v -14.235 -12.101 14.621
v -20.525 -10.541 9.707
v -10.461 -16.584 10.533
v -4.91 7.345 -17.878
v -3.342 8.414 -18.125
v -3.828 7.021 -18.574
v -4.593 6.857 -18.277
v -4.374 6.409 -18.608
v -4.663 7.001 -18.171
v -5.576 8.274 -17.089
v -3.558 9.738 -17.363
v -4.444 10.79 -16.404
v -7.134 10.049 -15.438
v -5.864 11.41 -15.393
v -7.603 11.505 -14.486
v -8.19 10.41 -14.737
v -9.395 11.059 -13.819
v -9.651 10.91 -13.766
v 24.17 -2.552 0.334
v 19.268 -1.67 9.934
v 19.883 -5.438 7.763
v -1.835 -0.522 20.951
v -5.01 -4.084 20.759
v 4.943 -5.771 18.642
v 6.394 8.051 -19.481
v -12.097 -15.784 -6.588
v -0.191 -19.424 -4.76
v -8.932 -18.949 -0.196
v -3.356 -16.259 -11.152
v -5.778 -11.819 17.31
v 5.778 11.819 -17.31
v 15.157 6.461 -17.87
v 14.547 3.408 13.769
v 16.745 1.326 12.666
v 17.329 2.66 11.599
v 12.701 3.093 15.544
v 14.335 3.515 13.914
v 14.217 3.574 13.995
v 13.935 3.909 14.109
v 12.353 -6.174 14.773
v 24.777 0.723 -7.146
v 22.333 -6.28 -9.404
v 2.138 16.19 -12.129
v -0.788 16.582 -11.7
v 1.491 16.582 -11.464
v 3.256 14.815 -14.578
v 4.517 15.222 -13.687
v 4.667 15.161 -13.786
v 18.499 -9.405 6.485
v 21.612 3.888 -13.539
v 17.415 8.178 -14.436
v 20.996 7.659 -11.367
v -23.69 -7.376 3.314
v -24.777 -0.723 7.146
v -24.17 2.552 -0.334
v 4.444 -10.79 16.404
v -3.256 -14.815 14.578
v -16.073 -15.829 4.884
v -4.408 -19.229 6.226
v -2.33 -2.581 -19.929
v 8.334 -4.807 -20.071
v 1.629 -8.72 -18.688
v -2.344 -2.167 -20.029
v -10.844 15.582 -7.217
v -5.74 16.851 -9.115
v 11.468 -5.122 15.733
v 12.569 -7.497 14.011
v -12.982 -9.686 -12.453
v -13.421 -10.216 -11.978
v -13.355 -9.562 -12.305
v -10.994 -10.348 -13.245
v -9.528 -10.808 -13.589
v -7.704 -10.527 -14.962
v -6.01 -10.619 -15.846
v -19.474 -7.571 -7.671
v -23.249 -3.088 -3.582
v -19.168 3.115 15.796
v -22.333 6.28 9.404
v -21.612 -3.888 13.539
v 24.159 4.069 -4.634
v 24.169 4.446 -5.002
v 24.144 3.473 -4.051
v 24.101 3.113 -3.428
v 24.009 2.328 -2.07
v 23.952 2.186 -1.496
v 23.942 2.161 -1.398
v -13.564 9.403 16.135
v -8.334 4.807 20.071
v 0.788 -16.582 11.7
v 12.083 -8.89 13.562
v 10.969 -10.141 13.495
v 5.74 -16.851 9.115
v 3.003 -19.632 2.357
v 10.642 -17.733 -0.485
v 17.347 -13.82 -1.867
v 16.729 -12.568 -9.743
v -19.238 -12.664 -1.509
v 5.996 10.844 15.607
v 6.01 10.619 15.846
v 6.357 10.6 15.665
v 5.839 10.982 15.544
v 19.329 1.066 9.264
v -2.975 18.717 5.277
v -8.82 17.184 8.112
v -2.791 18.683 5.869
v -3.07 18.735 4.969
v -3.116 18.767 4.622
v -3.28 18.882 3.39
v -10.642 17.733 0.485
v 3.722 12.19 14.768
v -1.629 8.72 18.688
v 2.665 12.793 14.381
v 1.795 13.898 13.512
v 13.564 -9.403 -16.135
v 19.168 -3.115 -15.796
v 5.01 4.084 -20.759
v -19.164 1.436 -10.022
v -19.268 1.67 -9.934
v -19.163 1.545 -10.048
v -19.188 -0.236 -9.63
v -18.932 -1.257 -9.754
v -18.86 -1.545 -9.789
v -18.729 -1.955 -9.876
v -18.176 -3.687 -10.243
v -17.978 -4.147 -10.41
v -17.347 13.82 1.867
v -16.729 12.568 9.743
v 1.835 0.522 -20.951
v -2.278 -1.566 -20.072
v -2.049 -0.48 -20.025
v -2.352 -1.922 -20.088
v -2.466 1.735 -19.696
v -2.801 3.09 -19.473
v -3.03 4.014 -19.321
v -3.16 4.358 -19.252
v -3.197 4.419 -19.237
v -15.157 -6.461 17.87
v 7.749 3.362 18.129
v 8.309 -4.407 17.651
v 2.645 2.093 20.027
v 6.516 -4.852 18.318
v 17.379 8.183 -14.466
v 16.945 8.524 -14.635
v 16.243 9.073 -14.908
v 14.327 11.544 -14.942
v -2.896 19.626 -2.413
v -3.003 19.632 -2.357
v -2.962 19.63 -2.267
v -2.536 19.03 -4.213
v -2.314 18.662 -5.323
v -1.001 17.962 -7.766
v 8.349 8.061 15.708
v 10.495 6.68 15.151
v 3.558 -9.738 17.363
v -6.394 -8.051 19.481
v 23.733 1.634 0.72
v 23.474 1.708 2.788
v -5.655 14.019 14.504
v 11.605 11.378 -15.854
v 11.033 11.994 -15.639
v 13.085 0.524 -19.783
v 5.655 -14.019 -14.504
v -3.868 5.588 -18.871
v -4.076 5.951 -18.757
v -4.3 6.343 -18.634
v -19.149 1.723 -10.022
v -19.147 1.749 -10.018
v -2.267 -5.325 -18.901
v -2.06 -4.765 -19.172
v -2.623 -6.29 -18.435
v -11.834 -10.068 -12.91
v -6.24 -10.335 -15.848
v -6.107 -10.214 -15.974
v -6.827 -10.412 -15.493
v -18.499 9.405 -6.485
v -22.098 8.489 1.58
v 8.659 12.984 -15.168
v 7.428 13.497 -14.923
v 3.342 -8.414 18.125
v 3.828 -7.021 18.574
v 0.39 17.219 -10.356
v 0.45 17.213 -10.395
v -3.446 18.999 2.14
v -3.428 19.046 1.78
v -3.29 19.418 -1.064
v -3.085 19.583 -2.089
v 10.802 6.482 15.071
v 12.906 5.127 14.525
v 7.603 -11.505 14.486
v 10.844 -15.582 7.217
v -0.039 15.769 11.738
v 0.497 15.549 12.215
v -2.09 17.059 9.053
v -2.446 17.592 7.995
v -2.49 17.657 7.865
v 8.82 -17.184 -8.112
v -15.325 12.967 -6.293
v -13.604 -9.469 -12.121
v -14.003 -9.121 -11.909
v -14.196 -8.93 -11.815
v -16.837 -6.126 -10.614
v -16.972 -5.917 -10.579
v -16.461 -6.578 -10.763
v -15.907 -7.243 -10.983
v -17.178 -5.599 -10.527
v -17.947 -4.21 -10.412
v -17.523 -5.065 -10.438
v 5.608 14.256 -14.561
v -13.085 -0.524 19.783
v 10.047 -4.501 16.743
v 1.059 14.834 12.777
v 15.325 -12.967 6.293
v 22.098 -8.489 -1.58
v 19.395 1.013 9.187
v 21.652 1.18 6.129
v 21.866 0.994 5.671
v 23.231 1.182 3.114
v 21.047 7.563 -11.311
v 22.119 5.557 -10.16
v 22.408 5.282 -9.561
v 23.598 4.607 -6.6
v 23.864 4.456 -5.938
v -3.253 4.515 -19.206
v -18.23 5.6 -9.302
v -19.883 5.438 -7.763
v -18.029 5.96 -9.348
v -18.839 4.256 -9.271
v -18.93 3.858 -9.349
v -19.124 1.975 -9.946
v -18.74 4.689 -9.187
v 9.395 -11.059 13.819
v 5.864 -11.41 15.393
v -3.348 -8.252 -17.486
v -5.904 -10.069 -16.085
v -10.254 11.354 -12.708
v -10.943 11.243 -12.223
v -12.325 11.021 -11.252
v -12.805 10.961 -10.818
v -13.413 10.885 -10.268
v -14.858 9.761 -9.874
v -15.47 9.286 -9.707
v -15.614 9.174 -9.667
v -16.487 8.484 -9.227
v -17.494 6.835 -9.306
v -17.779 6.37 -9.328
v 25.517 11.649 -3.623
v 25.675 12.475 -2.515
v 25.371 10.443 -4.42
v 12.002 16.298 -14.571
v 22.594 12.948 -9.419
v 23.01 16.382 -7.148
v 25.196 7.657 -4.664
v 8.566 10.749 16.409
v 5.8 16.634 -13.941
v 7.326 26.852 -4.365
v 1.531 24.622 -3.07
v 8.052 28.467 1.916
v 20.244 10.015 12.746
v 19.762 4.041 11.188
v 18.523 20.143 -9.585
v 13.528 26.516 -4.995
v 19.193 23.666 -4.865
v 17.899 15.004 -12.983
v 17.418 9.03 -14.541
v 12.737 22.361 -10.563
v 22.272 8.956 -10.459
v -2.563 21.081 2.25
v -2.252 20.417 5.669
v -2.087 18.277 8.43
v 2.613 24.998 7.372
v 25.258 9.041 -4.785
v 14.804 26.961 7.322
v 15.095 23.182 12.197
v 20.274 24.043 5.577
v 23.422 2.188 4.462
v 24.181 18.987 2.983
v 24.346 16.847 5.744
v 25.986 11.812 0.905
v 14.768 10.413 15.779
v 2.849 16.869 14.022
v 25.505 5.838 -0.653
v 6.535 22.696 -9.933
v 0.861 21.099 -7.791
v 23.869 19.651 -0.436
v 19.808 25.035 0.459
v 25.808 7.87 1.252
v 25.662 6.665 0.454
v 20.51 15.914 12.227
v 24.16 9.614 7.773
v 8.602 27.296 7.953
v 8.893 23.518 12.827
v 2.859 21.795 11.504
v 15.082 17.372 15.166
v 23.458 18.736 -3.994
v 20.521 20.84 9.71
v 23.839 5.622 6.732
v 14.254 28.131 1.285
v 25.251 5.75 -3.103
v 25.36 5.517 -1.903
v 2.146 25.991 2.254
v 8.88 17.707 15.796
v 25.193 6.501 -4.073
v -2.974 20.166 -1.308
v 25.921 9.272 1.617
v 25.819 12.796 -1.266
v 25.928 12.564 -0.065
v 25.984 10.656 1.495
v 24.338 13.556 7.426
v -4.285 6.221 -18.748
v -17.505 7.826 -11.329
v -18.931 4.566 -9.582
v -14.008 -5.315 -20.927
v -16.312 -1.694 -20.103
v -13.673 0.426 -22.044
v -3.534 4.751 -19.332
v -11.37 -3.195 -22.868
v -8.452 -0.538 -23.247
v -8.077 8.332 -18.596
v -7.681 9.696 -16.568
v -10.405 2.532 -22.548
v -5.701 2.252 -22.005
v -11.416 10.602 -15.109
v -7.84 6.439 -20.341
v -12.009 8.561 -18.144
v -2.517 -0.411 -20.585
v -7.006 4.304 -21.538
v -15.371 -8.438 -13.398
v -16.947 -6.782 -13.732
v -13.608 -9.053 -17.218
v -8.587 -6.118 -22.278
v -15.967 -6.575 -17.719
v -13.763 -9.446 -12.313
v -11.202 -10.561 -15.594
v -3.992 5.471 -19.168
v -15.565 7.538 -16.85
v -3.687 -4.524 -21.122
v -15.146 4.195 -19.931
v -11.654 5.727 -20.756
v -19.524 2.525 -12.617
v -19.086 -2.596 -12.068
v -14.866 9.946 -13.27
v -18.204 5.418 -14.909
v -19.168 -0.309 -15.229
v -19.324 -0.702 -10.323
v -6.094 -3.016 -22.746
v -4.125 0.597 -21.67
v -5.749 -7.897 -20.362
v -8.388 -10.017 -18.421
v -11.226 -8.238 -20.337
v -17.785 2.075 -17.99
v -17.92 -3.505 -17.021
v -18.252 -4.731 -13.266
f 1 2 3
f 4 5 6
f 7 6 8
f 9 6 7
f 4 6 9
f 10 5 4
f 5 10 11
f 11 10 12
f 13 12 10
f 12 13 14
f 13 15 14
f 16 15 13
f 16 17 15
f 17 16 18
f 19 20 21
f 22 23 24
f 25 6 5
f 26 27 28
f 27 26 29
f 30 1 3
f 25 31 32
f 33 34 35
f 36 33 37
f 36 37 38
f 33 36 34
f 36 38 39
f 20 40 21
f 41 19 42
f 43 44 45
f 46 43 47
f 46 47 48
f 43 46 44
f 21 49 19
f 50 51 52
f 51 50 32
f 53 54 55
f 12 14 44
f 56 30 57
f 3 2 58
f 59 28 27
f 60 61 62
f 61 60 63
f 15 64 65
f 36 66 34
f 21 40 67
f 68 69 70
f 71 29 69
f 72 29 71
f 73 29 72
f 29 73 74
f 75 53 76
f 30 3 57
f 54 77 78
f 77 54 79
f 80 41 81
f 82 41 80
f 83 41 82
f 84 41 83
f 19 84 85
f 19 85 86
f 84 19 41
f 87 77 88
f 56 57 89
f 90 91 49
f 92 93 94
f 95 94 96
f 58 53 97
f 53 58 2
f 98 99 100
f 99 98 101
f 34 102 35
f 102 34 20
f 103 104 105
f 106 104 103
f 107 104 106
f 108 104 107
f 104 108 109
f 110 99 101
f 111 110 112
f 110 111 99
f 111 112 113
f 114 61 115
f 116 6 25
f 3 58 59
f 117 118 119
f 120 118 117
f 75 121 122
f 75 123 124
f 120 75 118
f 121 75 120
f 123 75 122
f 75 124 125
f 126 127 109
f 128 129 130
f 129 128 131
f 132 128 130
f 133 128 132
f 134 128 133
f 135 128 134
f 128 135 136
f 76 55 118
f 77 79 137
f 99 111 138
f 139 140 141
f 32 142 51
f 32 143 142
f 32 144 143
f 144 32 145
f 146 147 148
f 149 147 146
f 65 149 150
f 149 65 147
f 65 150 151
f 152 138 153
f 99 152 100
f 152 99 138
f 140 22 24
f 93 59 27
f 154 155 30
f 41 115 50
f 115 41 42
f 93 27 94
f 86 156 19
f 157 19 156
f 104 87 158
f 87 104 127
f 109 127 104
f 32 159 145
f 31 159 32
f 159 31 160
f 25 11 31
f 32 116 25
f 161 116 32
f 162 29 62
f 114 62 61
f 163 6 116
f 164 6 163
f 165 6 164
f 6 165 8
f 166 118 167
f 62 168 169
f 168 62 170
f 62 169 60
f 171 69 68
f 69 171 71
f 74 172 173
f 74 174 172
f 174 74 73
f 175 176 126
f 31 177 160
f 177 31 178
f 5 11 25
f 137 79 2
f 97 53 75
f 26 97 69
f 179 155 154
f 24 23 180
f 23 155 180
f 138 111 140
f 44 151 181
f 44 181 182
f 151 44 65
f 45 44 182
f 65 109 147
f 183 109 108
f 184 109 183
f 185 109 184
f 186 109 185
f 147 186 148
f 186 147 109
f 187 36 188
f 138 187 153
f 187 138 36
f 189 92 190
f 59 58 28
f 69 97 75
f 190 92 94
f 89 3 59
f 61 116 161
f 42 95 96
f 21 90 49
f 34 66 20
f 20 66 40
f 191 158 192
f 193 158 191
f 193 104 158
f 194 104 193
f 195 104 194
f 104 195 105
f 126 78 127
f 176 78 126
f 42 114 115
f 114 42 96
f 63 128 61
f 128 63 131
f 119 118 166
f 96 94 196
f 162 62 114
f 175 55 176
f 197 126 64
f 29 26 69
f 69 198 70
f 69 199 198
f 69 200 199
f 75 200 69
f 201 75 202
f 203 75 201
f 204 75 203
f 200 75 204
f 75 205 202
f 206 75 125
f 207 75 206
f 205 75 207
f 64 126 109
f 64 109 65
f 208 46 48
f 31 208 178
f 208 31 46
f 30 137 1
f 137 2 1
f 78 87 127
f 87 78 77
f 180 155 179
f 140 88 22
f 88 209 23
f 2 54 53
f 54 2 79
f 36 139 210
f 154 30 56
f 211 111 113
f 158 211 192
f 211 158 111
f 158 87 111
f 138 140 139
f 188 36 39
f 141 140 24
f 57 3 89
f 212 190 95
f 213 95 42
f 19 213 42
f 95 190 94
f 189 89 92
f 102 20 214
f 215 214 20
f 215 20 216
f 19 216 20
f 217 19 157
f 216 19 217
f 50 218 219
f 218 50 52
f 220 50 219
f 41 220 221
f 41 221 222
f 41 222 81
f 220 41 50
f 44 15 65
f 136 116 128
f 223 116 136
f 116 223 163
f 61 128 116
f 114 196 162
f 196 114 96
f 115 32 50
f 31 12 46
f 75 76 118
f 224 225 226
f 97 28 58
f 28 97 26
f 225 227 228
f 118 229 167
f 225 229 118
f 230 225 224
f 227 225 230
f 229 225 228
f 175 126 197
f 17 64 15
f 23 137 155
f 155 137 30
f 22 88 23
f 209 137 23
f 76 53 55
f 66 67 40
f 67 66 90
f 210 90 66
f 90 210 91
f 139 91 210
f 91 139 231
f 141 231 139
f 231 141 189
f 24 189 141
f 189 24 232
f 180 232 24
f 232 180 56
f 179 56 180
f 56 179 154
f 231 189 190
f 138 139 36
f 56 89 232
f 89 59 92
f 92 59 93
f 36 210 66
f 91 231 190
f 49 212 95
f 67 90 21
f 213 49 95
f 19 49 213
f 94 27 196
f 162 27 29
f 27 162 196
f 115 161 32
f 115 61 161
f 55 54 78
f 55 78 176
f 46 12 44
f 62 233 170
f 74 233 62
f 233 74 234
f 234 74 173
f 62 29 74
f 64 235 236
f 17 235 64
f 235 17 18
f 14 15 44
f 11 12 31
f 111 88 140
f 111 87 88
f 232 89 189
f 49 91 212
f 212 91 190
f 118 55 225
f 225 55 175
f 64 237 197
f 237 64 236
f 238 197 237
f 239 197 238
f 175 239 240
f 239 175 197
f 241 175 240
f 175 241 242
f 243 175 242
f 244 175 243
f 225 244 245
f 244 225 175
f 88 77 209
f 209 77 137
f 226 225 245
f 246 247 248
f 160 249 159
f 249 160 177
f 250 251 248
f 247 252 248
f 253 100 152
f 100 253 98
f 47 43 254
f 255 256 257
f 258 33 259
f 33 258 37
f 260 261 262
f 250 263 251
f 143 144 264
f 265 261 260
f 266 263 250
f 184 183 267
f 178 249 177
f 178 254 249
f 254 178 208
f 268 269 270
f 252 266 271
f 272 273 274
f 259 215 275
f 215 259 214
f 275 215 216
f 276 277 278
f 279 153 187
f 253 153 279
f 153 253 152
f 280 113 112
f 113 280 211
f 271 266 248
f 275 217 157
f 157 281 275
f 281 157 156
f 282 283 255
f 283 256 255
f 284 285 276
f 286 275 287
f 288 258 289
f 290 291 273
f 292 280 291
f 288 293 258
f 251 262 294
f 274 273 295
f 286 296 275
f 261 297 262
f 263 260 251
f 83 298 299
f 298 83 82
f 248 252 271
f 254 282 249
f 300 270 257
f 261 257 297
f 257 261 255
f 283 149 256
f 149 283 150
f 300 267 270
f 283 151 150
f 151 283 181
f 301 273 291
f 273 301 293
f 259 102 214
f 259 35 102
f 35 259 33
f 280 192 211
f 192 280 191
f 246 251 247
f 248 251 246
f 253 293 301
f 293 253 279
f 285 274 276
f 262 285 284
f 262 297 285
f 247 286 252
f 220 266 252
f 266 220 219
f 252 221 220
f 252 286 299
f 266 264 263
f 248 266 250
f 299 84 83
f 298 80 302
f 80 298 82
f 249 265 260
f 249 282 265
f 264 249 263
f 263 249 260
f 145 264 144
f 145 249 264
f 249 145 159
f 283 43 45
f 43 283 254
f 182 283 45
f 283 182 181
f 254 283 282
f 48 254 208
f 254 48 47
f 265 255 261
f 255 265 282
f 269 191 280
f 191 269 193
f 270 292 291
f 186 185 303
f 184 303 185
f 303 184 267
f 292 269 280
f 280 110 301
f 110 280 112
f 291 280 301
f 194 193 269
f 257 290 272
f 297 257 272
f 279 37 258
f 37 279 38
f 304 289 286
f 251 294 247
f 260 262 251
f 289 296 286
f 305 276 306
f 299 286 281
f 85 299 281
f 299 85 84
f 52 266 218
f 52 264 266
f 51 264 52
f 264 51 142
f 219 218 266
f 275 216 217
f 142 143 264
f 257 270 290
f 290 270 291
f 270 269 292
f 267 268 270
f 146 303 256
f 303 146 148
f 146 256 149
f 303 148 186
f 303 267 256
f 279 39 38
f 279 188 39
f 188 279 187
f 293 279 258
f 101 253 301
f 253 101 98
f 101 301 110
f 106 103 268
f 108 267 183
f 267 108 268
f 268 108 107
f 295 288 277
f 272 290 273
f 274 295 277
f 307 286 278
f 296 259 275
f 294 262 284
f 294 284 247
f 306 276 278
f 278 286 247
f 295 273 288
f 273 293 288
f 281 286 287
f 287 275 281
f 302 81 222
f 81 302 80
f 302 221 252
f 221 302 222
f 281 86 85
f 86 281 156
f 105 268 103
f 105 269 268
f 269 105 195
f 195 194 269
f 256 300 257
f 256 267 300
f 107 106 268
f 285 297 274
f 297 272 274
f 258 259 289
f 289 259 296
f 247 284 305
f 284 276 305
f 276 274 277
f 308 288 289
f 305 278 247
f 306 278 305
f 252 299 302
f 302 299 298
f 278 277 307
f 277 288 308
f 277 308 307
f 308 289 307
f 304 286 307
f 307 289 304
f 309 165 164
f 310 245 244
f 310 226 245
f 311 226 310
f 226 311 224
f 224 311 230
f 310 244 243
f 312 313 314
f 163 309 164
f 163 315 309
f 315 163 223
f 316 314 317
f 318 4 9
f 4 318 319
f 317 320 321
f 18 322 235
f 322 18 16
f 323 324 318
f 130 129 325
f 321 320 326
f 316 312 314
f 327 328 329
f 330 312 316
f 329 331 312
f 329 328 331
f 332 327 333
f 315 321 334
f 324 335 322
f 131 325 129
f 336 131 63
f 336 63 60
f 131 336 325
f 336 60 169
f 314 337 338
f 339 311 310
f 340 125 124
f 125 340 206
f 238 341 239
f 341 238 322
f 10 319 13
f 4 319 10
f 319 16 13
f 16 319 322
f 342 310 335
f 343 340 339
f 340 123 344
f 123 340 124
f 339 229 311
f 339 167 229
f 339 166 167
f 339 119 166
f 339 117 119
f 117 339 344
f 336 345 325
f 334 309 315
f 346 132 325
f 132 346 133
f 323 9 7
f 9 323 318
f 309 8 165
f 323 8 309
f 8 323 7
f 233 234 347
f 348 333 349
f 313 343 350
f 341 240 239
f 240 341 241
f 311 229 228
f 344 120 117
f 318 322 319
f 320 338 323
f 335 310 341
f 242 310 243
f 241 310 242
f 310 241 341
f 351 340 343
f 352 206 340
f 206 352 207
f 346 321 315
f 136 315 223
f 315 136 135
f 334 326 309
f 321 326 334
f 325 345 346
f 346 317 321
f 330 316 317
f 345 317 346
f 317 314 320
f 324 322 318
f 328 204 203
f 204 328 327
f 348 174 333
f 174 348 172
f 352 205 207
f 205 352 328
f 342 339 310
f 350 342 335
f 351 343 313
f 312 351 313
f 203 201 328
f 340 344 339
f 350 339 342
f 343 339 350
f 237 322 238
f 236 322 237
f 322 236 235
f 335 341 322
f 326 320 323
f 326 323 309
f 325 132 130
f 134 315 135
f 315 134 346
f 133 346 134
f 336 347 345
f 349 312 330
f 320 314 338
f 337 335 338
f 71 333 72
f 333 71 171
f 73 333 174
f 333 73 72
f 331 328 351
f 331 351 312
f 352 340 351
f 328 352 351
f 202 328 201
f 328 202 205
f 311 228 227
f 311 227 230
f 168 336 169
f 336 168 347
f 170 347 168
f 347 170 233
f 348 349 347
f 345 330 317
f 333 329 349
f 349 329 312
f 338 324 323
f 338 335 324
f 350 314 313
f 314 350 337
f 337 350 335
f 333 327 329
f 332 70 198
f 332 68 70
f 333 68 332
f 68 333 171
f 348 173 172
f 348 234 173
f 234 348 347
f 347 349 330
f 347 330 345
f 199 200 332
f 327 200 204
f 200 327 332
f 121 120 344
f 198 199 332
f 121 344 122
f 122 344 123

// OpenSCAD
$fn=16;
rotate(a = 35, v = [1, 1, 0])
union() {
	scale(v = [1.3, 1.0, 1.0])
		sphere(r = 20);
	translate(v = [10, 10, 0])
		rotate(a = 70, v = [0, 1, 0])
			scale( v = [1.0, 1.2, 1.0])
				sphere(r = 16);
	rotate(a = 30, v = [0, 1, 1])
		translate(v = [0, -5, -15])
			rotate(a = 90, v = [0, 1, 0])
				scale(v = [1, 1.2, 1])
					sphere(r = 10);
}
